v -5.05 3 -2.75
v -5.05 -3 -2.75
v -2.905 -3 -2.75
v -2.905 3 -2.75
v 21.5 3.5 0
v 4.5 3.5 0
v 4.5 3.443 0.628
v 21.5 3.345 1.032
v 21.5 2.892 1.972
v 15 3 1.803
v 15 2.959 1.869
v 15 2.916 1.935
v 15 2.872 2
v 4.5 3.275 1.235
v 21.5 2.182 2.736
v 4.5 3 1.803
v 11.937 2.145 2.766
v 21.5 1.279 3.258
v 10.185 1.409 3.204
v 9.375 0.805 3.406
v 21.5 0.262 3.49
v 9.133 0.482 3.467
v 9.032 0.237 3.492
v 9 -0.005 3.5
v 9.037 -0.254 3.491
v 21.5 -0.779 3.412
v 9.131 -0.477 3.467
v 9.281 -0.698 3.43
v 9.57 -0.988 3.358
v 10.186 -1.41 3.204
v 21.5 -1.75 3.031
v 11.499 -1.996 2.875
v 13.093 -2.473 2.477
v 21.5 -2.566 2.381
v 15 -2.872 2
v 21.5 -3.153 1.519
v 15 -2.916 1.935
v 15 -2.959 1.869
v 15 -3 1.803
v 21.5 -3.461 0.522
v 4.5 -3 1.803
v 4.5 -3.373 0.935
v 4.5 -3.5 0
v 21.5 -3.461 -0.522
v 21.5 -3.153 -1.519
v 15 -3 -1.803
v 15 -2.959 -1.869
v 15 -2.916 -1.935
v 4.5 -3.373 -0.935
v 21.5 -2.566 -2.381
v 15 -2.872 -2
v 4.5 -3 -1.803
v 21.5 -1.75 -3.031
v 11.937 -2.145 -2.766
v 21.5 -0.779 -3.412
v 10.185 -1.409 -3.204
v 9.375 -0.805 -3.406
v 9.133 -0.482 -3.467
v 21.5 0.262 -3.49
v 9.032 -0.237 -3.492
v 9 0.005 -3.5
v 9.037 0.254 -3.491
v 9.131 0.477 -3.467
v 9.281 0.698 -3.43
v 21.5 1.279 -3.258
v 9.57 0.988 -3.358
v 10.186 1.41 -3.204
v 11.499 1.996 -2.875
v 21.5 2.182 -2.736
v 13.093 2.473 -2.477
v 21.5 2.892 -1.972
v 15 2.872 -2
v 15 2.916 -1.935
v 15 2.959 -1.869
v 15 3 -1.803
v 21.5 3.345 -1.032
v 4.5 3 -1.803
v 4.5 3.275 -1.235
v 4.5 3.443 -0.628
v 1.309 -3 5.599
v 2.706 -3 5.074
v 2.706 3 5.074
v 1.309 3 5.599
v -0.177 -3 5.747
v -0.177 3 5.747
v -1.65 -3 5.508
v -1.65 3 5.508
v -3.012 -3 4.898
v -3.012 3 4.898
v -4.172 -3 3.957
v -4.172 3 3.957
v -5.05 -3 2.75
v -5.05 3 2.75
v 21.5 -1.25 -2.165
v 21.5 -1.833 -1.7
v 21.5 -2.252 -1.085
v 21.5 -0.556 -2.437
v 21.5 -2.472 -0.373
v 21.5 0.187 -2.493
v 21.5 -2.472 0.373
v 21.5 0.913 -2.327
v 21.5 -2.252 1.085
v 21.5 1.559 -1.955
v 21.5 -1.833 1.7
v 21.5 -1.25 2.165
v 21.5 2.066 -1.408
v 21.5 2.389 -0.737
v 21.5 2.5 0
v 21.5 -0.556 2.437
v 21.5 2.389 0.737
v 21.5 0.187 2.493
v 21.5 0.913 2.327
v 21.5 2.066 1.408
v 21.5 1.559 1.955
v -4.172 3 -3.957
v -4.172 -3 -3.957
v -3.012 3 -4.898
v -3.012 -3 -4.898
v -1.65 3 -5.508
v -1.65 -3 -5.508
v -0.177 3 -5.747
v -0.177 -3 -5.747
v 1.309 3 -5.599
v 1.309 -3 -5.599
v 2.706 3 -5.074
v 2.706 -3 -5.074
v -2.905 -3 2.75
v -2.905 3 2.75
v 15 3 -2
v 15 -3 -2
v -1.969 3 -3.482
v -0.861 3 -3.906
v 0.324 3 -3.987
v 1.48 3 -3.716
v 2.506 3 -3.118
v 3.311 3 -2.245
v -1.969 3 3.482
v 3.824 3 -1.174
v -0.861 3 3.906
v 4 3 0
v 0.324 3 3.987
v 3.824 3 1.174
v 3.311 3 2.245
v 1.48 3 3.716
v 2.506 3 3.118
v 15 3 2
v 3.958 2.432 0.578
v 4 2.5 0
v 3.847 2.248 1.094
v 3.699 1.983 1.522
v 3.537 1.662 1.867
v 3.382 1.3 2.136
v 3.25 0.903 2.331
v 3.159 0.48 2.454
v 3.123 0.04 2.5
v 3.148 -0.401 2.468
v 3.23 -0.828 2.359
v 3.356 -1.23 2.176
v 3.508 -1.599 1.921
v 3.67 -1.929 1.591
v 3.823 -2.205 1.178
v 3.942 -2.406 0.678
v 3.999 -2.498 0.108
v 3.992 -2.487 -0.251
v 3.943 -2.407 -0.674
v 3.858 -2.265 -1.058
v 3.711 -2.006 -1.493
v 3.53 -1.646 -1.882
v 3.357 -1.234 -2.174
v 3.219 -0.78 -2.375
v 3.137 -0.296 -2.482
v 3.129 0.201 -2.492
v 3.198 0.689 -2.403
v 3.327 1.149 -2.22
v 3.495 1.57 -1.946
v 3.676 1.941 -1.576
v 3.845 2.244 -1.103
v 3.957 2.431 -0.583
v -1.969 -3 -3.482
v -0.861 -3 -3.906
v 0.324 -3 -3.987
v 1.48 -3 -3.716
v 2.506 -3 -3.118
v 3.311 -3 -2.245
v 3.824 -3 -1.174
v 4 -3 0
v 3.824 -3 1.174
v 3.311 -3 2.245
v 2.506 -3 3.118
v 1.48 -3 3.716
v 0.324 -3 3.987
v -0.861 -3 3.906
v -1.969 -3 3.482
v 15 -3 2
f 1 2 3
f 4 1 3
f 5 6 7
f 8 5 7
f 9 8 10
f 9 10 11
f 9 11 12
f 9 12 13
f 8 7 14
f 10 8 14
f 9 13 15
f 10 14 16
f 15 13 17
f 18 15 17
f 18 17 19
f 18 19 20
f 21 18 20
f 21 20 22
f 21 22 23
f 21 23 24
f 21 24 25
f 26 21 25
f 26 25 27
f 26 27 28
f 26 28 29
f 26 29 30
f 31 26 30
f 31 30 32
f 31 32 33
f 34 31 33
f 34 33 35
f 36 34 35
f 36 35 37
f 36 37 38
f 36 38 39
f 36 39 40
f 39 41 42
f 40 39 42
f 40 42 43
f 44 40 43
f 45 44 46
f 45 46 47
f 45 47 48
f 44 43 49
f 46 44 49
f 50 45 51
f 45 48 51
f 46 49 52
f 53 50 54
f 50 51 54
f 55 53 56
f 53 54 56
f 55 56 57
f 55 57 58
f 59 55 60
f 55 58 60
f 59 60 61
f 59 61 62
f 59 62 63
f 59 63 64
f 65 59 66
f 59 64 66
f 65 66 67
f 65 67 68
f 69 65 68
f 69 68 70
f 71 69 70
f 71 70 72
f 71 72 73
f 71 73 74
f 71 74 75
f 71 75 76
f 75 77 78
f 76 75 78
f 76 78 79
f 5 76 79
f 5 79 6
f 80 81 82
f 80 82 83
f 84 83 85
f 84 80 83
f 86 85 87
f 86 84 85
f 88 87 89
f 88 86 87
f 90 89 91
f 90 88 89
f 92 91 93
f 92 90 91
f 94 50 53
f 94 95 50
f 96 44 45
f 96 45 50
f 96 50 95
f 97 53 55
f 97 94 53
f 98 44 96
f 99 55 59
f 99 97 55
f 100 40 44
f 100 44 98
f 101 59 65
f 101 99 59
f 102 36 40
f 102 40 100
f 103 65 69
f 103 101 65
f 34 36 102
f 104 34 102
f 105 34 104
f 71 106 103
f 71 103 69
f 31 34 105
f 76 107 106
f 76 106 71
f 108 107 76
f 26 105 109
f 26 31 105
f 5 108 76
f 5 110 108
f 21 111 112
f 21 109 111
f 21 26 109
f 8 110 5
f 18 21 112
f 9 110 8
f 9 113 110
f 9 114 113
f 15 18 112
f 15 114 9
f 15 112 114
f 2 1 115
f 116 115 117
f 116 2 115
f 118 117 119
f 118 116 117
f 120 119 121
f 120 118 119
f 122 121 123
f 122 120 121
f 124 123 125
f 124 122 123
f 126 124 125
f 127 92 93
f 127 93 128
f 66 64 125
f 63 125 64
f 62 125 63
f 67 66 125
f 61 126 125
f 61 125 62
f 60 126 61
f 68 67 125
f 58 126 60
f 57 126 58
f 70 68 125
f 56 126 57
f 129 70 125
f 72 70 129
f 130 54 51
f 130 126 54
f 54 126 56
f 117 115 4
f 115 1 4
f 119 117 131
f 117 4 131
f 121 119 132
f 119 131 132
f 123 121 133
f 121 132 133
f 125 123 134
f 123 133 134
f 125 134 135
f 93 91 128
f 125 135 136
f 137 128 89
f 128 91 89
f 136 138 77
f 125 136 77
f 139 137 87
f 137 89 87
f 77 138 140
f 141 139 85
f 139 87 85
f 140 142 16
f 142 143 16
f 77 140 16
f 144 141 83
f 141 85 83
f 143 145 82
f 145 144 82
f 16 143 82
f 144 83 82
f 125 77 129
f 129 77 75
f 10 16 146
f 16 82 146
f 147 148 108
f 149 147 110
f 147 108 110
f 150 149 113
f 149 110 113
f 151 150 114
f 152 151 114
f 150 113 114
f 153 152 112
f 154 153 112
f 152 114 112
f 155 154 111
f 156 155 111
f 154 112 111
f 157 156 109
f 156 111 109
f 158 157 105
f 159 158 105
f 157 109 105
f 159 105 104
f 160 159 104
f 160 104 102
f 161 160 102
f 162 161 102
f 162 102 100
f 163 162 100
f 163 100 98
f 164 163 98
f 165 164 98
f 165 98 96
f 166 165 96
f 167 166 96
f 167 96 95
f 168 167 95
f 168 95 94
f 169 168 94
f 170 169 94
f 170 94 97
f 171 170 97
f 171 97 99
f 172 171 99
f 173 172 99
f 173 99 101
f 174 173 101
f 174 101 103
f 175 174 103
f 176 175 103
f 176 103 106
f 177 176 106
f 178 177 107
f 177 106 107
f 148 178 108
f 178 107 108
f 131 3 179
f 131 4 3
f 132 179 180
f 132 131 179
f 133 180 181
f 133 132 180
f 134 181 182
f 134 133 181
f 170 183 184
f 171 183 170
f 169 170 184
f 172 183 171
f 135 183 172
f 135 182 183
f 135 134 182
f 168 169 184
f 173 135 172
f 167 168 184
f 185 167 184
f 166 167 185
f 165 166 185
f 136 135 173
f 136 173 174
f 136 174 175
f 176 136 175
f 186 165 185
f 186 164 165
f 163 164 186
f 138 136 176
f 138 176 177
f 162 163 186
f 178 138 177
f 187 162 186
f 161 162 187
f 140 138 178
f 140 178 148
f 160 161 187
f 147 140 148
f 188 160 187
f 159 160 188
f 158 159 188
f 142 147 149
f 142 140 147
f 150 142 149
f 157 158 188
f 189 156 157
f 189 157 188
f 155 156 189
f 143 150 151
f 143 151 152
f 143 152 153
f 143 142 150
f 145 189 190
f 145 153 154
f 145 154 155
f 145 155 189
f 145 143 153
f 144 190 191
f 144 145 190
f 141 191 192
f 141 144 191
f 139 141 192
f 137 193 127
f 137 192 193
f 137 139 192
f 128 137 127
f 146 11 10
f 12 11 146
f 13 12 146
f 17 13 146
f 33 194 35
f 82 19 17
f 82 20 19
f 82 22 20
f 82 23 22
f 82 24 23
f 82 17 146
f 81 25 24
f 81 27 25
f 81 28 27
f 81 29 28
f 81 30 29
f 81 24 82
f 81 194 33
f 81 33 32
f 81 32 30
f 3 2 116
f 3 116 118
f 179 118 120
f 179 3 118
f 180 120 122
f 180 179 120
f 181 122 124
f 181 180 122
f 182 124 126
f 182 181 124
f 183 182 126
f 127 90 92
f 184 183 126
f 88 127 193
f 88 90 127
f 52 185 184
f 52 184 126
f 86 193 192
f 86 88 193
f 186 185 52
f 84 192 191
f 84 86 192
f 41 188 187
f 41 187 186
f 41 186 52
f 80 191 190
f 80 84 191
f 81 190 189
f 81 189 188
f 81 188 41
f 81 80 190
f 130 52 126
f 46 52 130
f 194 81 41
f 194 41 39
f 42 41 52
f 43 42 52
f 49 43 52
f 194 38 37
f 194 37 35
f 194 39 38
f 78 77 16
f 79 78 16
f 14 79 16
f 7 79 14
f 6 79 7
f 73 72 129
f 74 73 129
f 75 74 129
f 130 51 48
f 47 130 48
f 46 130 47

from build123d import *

# Parameters (mm, degrees)
F0_R      = 5.75
F0_R_2    = 4
F1_DEPTH  = 3
F3_R      = 3.5
F4_DEPTH  = 17
F5_W      = 20
F5_H      = 5.5
F6_DEPTH  = 25
F12_DEPTH = 6
F10_R     = 2.5
F13_DEPTH = 25


with BuildPart() as f1:
    # F0 (on Front) → F1 (new body, symmetric)
    with BuildSketch(Plane.XZ):
        Circle(F0_R)
        Circle(F0_R_2, mode=Mode.SUBTRACT)
    extrude(amount=F1_DEPTH, both=True)

    # F3 (on offset) → F4 (join)
    with BuildSketch(Plane.YZ.offset(4.5)):
        Circle(F3_R)
    extrude(amount=F4_DEPTH)

    # F5 (on face) → F6 (cut)
    with BuildSketch(Plane.XZ.offset(3)):
        with Locations((-10, 0)):
            Rectangle(F5_W, F5_H)
    extrude(amount=-F6_DEPTH, mode=Mode.SUBTRACT)

    # F11 (on face) → F12 (join)
    with BuildSketch(Plane.XZ.offset(3)):
        Polygon((15, 2), (0, 5.75), (4.887585, 1.127019), (4.887585, -0.959626), (0, -5.75), (15, -2), align=None)
    extrude(amount=-F12_DEPTH)

    # F10 (on face) → F13 (cut)
    with BuildSketch(Plane.YZ.offset(21.5)):
        Circle(F10_R)
    extrude(amount=-F13_DEPTH, mode=Mode.SUBTRACT)


solid = f1.part
